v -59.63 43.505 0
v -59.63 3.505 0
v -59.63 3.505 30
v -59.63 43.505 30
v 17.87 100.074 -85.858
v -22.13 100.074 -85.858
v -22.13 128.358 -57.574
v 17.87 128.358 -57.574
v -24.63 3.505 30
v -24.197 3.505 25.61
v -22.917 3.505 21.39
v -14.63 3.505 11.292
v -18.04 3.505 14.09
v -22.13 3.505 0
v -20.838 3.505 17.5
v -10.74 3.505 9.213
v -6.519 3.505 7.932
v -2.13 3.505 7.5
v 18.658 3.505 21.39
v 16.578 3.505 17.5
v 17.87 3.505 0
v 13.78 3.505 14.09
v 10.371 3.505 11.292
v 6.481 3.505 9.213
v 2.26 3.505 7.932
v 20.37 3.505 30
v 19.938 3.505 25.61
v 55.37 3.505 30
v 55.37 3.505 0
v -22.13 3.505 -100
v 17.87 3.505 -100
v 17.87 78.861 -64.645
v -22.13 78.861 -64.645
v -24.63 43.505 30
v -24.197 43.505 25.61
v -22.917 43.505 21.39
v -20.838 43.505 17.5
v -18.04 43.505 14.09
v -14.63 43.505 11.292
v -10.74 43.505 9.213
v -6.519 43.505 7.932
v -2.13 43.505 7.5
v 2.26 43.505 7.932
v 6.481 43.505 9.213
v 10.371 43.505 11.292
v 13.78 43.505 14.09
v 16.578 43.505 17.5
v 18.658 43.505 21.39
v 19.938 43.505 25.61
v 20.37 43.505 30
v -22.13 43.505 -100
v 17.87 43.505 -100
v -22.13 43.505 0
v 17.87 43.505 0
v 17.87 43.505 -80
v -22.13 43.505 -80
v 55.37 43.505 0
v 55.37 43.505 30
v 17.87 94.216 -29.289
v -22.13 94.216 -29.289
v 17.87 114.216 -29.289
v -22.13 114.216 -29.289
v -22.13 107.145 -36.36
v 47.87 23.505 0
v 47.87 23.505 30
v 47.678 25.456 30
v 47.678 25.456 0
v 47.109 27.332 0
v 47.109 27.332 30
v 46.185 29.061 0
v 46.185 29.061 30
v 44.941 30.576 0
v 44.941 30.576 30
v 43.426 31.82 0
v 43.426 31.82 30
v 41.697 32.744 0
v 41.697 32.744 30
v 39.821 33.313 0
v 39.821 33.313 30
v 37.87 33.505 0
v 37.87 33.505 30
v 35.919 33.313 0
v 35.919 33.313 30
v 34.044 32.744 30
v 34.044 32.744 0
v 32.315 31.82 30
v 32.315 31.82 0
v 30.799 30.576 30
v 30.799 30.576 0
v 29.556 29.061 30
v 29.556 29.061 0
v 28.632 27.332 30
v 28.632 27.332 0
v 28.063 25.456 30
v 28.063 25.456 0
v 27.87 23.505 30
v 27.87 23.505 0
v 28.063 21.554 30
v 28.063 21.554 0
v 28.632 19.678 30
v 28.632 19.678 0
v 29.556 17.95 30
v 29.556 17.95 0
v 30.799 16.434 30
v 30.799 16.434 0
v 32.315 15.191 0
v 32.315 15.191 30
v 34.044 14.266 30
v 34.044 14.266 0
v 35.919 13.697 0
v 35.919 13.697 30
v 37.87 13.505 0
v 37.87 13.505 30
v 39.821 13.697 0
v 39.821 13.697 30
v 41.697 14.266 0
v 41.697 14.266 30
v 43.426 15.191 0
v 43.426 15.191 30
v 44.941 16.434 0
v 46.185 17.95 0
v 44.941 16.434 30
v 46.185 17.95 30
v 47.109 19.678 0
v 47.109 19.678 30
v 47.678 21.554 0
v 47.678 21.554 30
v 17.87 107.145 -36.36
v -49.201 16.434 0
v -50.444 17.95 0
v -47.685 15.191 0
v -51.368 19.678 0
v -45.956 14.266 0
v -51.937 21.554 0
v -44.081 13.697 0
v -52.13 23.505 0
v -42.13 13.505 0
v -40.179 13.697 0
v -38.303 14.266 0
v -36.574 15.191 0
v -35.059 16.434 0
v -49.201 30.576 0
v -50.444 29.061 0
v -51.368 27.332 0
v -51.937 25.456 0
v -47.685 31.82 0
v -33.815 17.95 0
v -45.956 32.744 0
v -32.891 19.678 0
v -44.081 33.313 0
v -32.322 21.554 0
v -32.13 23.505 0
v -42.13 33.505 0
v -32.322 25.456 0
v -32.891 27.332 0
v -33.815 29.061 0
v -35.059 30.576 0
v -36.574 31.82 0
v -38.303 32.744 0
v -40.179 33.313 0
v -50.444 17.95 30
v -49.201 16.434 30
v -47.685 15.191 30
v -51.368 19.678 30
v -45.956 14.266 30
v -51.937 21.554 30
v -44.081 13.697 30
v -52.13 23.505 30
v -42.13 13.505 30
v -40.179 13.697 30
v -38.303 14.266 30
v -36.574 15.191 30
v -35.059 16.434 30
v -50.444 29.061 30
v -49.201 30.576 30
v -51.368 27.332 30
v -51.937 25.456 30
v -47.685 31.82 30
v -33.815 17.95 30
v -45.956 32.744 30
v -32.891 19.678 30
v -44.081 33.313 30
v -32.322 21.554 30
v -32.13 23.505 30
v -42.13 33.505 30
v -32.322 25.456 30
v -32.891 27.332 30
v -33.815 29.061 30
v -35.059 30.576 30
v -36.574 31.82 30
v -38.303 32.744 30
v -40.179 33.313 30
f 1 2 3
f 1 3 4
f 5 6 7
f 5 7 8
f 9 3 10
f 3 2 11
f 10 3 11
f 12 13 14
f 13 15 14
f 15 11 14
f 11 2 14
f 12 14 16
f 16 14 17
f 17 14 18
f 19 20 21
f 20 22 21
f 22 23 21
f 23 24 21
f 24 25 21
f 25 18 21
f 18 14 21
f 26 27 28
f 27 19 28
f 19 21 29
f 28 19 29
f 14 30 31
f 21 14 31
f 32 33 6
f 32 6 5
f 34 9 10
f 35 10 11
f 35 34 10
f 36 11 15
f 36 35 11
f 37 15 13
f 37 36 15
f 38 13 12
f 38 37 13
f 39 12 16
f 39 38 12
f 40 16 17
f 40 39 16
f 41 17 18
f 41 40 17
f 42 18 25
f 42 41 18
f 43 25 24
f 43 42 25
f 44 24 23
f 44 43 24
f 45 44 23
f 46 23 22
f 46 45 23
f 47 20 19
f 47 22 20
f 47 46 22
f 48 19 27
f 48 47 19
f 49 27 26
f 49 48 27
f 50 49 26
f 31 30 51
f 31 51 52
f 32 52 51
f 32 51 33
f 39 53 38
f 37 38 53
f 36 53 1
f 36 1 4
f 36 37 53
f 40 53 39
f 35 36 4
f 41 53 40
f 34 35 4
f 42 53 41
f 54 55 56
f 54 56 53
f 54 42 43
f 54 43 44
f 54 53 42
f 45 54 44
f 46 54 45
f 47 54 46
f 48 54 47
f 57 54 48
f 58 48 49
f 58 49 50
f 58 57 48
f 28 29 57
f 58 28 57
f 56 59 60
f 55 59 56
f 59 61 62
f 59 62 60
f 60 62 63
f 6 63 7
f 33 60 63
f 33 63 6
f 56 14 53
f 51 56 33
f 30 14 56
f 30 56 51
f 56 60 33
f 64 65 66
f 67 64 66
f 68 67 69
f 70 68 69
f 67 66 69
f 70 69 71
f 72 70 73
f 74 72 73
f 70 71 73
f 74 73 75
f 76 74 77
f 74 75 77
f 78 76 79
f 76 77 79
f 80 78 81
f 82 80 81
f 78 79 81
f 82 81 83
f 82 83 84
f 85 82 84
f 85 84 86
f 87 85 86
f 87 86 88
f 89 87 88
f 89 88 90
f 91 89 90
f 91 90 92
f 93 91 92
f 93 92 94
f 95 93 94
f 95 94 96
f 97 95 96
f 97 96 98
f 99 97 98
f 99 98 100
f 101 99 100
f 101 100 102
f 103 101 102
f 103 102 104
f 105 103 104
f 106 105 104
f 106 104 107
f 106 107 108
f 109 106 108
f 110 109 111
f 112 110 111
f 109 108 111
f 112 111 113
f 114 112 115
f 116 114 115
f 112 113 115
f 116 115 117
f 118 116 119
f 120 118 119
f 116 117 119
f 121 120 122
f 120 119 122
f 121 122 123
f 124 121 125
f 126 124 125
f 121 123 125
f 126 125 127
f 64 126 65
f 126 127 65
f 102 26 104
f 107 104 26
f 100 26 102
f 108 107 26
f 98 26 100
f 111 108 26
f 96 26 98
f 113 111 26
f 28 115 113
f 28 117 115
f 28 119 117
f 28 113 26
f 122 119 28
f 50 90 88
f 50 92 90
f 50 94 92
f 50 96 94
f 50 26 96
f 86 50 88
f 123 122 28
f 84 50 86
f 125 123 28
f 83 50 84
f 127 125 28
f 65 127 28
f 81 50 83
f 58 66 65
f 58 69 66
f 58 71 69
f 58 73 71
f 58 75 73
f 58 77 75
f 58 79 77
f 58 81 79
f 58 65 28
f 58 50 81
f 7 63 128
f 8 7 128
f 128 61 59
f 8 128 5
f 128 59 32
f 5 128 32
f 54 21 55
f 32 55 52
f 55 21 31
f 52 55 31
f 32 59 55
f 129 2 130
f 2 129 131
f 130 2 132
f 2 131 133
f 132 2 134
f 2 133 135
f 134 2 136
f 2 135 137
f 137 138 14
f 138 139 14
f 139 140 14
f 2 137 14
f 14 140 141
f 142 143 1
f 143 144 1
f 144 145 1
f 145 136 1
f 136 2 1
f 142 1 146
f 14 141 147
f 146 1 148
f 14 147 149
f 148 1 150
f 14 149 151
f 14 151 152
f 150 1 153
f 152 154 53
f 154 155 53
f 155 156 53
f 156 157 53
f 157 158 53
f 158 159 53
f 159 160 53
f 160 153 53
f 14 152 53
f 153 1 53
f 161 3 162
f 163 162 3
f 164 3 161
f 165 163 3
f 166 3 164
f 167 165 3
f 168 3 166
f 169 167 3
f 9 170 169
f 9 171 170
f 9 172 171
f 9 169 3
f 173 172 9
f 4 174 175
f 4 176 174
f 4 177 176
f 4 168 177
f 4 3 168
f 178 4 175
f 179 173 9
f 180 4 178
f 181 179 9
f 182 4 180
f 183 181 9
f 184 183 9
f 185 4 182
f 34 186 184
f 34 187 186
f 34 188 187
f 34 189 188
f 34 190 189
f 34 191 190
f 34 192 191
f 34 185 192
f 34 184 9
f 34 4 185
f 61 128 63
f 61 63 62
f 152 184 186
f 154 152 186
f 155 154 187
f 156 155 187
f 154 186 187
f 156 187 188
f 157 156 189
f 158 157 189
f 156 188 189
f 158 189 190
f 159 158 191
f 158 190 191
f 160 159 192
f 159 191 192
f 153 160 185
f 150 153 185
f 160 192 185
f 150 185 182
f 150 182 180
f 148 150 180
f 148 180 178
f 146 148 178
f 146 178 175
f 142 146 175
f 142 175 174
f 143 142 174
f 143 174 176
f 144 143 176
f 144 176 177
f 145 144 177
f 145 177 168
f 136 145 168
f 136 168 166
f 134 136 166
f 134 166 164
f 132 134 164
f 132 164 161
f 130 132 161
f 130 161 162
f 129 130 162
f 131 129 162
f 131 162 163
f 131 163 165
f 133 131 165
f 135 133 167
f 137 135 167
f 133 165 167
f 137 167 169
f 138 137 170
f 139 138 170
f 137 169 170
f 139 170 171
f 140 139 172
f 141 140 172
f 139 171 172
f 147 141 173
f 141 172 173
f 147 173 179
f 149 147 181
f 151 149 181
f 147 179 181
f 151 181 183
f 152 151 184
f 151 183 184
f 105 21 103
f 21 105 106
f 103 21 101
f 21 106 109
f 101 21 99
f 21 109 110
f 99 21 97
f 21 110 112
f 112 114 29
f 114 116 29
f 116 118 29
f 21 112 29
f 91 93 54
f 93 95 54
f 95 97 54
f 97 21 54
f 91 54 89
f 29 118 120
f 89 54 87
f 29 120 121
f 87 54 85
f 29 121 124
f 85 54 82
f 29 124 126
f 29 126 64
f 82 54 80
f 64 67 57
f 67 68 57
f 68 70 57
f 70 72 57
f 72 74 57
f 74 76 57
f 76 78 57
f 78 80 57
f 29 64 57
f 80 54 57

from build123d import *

# Parameters (mm, degrees)
SKETCH2_W           = 115
SKETCH2_H           = 40
BOSS_EXTRUDE1_DEPTH = 60
CUT_EXTRUDE1_DEPTH  = 60
SKETCH4_R           = 10
CUT_EXTRUDE2_DEPTH  = 60
SKETCH5_W           = 40
SKETCH5_H           = 40
BOSS_EXTRUDE2_DEPTH = 100
SKETCH9_W           = 40
SKETCH9_H           = 100
BOSS_EXTRUDE4_DEPTH = 100
CUT_EXTRUDE10_DEPTH = 100
SKETCH12_W          = 40
SKETCH12_H          = 40
BOSS_EXTRUDE6_DEPTH = 30


with BuildPart() as part:
    # Sketch2 → Boss-Extrude1 (new body)
    with BuildSketch(Plane.XY):
        with Locations((-2.12962963, 23.505291005)):
            Rectangle(SKETCH2_W, SKETCH2_H)
    extrude(amount=BOSS_EXTRUDE1_DEPTH)

    # Sketch3 → Cut-Extrude1 (cut)
    with BuildSketch(Plane(origin=(0, 43.505291005, 0), x_dir=(1, 0, 0), z_dir=(0, 1, 0))):
        with BuildLine():
            Line((-59.62962963, -30), (-24.62962963, -30))
            ThreePointArc((-24.62962963, -30), (-2.12962963, -7.5), (20.37037037, -30))
            Line((20.37037037, -30), (55.37037037, -30))
            Line((55.37037037, -30), (55.37037037, -60))
            Line((55.37037037, -60), (-59.62962963, -60))
            Line((-59.62962963, -60), (-59.62962963, -30))
        make_face()
    extrude(amount=-CUT_EXTRUDE1_DEPTH, mode=Mode.SUBTRACT)

    # Sketch4 → Cut-Extrude2 (cut)
    with BuildSketch(Plane.XY.offset(30)):
        with Locations((-42.12962963, 23.505291005)):
            Circle(SKETCH4_R)
        with Locations((37.87037037, 23.505291005)):
            Circle(SKETCH4_R)
    extrude(amount=-CUT_EXTRUDE2_DEPTH, mode=Mode.SUBTRACT)

    # Sketch5 → Boss-Extrude2 (add)
    with BuildSketch(Plane(origin=(0, 0, 0), x_dir=(-1, 0, 0), z_dir=(0, 0, -1))):
        with Locations((2.12962963, 23.505291005)):
            Rectangle(SKETCH5_W, SKETCH5_H)
    extrude(amount=BOSS_EXTRUDE2_DEPTH)

    # Sketch9 → Boss-Extrude4 (add)
    with BuildSketch(Plane(origin=(0, 43.505291005, 0), x_dir=(1, 0, 0), z_dir=(0, 1, 0))):
        with Locations((-2.12962963, 50)):
            Rectangle(SKETCH9_W, SKETCH9_H)
    extrude(amount=BOSS_EXTRUDE4_DEPTH)

    # Sketch10 → Cut-Extrude10 (cut)
    with BuildSketch(Plane(origin=(17.87037037, 0, 0), x_dir=(0, 0, -1), z_dir=(1, 0, 0))):
        Polygon((100, 43.505291005), (29.289321881, 114.215969124), (29.289321881, 94.215969124), (80, 43.505291005), (0, 43.505291005), (0, 143.505291005), (100, 143.505291005), align=None)
    extrude(amount=-CUT_EXTRUDE10_DEPTH, mode=Mode.SUBTRACT)

    # Sketch12 → Boss-Extrude6 (add)
    with BuildSketch(Plane(origin=(0, 71.752645503, -71.752645503), x_dir=(1, 0, 0), z_dir=(0, 0.7071067811865513, -0.7071067811865438))):
        with Locations((-2.12962963, -30.052208169)):
            Rectangle(SKETCH12_W, SKETCH12_H)
    extrude(amount=BOSS_EXTRUDE6_DEPTH)


solid = part.part
